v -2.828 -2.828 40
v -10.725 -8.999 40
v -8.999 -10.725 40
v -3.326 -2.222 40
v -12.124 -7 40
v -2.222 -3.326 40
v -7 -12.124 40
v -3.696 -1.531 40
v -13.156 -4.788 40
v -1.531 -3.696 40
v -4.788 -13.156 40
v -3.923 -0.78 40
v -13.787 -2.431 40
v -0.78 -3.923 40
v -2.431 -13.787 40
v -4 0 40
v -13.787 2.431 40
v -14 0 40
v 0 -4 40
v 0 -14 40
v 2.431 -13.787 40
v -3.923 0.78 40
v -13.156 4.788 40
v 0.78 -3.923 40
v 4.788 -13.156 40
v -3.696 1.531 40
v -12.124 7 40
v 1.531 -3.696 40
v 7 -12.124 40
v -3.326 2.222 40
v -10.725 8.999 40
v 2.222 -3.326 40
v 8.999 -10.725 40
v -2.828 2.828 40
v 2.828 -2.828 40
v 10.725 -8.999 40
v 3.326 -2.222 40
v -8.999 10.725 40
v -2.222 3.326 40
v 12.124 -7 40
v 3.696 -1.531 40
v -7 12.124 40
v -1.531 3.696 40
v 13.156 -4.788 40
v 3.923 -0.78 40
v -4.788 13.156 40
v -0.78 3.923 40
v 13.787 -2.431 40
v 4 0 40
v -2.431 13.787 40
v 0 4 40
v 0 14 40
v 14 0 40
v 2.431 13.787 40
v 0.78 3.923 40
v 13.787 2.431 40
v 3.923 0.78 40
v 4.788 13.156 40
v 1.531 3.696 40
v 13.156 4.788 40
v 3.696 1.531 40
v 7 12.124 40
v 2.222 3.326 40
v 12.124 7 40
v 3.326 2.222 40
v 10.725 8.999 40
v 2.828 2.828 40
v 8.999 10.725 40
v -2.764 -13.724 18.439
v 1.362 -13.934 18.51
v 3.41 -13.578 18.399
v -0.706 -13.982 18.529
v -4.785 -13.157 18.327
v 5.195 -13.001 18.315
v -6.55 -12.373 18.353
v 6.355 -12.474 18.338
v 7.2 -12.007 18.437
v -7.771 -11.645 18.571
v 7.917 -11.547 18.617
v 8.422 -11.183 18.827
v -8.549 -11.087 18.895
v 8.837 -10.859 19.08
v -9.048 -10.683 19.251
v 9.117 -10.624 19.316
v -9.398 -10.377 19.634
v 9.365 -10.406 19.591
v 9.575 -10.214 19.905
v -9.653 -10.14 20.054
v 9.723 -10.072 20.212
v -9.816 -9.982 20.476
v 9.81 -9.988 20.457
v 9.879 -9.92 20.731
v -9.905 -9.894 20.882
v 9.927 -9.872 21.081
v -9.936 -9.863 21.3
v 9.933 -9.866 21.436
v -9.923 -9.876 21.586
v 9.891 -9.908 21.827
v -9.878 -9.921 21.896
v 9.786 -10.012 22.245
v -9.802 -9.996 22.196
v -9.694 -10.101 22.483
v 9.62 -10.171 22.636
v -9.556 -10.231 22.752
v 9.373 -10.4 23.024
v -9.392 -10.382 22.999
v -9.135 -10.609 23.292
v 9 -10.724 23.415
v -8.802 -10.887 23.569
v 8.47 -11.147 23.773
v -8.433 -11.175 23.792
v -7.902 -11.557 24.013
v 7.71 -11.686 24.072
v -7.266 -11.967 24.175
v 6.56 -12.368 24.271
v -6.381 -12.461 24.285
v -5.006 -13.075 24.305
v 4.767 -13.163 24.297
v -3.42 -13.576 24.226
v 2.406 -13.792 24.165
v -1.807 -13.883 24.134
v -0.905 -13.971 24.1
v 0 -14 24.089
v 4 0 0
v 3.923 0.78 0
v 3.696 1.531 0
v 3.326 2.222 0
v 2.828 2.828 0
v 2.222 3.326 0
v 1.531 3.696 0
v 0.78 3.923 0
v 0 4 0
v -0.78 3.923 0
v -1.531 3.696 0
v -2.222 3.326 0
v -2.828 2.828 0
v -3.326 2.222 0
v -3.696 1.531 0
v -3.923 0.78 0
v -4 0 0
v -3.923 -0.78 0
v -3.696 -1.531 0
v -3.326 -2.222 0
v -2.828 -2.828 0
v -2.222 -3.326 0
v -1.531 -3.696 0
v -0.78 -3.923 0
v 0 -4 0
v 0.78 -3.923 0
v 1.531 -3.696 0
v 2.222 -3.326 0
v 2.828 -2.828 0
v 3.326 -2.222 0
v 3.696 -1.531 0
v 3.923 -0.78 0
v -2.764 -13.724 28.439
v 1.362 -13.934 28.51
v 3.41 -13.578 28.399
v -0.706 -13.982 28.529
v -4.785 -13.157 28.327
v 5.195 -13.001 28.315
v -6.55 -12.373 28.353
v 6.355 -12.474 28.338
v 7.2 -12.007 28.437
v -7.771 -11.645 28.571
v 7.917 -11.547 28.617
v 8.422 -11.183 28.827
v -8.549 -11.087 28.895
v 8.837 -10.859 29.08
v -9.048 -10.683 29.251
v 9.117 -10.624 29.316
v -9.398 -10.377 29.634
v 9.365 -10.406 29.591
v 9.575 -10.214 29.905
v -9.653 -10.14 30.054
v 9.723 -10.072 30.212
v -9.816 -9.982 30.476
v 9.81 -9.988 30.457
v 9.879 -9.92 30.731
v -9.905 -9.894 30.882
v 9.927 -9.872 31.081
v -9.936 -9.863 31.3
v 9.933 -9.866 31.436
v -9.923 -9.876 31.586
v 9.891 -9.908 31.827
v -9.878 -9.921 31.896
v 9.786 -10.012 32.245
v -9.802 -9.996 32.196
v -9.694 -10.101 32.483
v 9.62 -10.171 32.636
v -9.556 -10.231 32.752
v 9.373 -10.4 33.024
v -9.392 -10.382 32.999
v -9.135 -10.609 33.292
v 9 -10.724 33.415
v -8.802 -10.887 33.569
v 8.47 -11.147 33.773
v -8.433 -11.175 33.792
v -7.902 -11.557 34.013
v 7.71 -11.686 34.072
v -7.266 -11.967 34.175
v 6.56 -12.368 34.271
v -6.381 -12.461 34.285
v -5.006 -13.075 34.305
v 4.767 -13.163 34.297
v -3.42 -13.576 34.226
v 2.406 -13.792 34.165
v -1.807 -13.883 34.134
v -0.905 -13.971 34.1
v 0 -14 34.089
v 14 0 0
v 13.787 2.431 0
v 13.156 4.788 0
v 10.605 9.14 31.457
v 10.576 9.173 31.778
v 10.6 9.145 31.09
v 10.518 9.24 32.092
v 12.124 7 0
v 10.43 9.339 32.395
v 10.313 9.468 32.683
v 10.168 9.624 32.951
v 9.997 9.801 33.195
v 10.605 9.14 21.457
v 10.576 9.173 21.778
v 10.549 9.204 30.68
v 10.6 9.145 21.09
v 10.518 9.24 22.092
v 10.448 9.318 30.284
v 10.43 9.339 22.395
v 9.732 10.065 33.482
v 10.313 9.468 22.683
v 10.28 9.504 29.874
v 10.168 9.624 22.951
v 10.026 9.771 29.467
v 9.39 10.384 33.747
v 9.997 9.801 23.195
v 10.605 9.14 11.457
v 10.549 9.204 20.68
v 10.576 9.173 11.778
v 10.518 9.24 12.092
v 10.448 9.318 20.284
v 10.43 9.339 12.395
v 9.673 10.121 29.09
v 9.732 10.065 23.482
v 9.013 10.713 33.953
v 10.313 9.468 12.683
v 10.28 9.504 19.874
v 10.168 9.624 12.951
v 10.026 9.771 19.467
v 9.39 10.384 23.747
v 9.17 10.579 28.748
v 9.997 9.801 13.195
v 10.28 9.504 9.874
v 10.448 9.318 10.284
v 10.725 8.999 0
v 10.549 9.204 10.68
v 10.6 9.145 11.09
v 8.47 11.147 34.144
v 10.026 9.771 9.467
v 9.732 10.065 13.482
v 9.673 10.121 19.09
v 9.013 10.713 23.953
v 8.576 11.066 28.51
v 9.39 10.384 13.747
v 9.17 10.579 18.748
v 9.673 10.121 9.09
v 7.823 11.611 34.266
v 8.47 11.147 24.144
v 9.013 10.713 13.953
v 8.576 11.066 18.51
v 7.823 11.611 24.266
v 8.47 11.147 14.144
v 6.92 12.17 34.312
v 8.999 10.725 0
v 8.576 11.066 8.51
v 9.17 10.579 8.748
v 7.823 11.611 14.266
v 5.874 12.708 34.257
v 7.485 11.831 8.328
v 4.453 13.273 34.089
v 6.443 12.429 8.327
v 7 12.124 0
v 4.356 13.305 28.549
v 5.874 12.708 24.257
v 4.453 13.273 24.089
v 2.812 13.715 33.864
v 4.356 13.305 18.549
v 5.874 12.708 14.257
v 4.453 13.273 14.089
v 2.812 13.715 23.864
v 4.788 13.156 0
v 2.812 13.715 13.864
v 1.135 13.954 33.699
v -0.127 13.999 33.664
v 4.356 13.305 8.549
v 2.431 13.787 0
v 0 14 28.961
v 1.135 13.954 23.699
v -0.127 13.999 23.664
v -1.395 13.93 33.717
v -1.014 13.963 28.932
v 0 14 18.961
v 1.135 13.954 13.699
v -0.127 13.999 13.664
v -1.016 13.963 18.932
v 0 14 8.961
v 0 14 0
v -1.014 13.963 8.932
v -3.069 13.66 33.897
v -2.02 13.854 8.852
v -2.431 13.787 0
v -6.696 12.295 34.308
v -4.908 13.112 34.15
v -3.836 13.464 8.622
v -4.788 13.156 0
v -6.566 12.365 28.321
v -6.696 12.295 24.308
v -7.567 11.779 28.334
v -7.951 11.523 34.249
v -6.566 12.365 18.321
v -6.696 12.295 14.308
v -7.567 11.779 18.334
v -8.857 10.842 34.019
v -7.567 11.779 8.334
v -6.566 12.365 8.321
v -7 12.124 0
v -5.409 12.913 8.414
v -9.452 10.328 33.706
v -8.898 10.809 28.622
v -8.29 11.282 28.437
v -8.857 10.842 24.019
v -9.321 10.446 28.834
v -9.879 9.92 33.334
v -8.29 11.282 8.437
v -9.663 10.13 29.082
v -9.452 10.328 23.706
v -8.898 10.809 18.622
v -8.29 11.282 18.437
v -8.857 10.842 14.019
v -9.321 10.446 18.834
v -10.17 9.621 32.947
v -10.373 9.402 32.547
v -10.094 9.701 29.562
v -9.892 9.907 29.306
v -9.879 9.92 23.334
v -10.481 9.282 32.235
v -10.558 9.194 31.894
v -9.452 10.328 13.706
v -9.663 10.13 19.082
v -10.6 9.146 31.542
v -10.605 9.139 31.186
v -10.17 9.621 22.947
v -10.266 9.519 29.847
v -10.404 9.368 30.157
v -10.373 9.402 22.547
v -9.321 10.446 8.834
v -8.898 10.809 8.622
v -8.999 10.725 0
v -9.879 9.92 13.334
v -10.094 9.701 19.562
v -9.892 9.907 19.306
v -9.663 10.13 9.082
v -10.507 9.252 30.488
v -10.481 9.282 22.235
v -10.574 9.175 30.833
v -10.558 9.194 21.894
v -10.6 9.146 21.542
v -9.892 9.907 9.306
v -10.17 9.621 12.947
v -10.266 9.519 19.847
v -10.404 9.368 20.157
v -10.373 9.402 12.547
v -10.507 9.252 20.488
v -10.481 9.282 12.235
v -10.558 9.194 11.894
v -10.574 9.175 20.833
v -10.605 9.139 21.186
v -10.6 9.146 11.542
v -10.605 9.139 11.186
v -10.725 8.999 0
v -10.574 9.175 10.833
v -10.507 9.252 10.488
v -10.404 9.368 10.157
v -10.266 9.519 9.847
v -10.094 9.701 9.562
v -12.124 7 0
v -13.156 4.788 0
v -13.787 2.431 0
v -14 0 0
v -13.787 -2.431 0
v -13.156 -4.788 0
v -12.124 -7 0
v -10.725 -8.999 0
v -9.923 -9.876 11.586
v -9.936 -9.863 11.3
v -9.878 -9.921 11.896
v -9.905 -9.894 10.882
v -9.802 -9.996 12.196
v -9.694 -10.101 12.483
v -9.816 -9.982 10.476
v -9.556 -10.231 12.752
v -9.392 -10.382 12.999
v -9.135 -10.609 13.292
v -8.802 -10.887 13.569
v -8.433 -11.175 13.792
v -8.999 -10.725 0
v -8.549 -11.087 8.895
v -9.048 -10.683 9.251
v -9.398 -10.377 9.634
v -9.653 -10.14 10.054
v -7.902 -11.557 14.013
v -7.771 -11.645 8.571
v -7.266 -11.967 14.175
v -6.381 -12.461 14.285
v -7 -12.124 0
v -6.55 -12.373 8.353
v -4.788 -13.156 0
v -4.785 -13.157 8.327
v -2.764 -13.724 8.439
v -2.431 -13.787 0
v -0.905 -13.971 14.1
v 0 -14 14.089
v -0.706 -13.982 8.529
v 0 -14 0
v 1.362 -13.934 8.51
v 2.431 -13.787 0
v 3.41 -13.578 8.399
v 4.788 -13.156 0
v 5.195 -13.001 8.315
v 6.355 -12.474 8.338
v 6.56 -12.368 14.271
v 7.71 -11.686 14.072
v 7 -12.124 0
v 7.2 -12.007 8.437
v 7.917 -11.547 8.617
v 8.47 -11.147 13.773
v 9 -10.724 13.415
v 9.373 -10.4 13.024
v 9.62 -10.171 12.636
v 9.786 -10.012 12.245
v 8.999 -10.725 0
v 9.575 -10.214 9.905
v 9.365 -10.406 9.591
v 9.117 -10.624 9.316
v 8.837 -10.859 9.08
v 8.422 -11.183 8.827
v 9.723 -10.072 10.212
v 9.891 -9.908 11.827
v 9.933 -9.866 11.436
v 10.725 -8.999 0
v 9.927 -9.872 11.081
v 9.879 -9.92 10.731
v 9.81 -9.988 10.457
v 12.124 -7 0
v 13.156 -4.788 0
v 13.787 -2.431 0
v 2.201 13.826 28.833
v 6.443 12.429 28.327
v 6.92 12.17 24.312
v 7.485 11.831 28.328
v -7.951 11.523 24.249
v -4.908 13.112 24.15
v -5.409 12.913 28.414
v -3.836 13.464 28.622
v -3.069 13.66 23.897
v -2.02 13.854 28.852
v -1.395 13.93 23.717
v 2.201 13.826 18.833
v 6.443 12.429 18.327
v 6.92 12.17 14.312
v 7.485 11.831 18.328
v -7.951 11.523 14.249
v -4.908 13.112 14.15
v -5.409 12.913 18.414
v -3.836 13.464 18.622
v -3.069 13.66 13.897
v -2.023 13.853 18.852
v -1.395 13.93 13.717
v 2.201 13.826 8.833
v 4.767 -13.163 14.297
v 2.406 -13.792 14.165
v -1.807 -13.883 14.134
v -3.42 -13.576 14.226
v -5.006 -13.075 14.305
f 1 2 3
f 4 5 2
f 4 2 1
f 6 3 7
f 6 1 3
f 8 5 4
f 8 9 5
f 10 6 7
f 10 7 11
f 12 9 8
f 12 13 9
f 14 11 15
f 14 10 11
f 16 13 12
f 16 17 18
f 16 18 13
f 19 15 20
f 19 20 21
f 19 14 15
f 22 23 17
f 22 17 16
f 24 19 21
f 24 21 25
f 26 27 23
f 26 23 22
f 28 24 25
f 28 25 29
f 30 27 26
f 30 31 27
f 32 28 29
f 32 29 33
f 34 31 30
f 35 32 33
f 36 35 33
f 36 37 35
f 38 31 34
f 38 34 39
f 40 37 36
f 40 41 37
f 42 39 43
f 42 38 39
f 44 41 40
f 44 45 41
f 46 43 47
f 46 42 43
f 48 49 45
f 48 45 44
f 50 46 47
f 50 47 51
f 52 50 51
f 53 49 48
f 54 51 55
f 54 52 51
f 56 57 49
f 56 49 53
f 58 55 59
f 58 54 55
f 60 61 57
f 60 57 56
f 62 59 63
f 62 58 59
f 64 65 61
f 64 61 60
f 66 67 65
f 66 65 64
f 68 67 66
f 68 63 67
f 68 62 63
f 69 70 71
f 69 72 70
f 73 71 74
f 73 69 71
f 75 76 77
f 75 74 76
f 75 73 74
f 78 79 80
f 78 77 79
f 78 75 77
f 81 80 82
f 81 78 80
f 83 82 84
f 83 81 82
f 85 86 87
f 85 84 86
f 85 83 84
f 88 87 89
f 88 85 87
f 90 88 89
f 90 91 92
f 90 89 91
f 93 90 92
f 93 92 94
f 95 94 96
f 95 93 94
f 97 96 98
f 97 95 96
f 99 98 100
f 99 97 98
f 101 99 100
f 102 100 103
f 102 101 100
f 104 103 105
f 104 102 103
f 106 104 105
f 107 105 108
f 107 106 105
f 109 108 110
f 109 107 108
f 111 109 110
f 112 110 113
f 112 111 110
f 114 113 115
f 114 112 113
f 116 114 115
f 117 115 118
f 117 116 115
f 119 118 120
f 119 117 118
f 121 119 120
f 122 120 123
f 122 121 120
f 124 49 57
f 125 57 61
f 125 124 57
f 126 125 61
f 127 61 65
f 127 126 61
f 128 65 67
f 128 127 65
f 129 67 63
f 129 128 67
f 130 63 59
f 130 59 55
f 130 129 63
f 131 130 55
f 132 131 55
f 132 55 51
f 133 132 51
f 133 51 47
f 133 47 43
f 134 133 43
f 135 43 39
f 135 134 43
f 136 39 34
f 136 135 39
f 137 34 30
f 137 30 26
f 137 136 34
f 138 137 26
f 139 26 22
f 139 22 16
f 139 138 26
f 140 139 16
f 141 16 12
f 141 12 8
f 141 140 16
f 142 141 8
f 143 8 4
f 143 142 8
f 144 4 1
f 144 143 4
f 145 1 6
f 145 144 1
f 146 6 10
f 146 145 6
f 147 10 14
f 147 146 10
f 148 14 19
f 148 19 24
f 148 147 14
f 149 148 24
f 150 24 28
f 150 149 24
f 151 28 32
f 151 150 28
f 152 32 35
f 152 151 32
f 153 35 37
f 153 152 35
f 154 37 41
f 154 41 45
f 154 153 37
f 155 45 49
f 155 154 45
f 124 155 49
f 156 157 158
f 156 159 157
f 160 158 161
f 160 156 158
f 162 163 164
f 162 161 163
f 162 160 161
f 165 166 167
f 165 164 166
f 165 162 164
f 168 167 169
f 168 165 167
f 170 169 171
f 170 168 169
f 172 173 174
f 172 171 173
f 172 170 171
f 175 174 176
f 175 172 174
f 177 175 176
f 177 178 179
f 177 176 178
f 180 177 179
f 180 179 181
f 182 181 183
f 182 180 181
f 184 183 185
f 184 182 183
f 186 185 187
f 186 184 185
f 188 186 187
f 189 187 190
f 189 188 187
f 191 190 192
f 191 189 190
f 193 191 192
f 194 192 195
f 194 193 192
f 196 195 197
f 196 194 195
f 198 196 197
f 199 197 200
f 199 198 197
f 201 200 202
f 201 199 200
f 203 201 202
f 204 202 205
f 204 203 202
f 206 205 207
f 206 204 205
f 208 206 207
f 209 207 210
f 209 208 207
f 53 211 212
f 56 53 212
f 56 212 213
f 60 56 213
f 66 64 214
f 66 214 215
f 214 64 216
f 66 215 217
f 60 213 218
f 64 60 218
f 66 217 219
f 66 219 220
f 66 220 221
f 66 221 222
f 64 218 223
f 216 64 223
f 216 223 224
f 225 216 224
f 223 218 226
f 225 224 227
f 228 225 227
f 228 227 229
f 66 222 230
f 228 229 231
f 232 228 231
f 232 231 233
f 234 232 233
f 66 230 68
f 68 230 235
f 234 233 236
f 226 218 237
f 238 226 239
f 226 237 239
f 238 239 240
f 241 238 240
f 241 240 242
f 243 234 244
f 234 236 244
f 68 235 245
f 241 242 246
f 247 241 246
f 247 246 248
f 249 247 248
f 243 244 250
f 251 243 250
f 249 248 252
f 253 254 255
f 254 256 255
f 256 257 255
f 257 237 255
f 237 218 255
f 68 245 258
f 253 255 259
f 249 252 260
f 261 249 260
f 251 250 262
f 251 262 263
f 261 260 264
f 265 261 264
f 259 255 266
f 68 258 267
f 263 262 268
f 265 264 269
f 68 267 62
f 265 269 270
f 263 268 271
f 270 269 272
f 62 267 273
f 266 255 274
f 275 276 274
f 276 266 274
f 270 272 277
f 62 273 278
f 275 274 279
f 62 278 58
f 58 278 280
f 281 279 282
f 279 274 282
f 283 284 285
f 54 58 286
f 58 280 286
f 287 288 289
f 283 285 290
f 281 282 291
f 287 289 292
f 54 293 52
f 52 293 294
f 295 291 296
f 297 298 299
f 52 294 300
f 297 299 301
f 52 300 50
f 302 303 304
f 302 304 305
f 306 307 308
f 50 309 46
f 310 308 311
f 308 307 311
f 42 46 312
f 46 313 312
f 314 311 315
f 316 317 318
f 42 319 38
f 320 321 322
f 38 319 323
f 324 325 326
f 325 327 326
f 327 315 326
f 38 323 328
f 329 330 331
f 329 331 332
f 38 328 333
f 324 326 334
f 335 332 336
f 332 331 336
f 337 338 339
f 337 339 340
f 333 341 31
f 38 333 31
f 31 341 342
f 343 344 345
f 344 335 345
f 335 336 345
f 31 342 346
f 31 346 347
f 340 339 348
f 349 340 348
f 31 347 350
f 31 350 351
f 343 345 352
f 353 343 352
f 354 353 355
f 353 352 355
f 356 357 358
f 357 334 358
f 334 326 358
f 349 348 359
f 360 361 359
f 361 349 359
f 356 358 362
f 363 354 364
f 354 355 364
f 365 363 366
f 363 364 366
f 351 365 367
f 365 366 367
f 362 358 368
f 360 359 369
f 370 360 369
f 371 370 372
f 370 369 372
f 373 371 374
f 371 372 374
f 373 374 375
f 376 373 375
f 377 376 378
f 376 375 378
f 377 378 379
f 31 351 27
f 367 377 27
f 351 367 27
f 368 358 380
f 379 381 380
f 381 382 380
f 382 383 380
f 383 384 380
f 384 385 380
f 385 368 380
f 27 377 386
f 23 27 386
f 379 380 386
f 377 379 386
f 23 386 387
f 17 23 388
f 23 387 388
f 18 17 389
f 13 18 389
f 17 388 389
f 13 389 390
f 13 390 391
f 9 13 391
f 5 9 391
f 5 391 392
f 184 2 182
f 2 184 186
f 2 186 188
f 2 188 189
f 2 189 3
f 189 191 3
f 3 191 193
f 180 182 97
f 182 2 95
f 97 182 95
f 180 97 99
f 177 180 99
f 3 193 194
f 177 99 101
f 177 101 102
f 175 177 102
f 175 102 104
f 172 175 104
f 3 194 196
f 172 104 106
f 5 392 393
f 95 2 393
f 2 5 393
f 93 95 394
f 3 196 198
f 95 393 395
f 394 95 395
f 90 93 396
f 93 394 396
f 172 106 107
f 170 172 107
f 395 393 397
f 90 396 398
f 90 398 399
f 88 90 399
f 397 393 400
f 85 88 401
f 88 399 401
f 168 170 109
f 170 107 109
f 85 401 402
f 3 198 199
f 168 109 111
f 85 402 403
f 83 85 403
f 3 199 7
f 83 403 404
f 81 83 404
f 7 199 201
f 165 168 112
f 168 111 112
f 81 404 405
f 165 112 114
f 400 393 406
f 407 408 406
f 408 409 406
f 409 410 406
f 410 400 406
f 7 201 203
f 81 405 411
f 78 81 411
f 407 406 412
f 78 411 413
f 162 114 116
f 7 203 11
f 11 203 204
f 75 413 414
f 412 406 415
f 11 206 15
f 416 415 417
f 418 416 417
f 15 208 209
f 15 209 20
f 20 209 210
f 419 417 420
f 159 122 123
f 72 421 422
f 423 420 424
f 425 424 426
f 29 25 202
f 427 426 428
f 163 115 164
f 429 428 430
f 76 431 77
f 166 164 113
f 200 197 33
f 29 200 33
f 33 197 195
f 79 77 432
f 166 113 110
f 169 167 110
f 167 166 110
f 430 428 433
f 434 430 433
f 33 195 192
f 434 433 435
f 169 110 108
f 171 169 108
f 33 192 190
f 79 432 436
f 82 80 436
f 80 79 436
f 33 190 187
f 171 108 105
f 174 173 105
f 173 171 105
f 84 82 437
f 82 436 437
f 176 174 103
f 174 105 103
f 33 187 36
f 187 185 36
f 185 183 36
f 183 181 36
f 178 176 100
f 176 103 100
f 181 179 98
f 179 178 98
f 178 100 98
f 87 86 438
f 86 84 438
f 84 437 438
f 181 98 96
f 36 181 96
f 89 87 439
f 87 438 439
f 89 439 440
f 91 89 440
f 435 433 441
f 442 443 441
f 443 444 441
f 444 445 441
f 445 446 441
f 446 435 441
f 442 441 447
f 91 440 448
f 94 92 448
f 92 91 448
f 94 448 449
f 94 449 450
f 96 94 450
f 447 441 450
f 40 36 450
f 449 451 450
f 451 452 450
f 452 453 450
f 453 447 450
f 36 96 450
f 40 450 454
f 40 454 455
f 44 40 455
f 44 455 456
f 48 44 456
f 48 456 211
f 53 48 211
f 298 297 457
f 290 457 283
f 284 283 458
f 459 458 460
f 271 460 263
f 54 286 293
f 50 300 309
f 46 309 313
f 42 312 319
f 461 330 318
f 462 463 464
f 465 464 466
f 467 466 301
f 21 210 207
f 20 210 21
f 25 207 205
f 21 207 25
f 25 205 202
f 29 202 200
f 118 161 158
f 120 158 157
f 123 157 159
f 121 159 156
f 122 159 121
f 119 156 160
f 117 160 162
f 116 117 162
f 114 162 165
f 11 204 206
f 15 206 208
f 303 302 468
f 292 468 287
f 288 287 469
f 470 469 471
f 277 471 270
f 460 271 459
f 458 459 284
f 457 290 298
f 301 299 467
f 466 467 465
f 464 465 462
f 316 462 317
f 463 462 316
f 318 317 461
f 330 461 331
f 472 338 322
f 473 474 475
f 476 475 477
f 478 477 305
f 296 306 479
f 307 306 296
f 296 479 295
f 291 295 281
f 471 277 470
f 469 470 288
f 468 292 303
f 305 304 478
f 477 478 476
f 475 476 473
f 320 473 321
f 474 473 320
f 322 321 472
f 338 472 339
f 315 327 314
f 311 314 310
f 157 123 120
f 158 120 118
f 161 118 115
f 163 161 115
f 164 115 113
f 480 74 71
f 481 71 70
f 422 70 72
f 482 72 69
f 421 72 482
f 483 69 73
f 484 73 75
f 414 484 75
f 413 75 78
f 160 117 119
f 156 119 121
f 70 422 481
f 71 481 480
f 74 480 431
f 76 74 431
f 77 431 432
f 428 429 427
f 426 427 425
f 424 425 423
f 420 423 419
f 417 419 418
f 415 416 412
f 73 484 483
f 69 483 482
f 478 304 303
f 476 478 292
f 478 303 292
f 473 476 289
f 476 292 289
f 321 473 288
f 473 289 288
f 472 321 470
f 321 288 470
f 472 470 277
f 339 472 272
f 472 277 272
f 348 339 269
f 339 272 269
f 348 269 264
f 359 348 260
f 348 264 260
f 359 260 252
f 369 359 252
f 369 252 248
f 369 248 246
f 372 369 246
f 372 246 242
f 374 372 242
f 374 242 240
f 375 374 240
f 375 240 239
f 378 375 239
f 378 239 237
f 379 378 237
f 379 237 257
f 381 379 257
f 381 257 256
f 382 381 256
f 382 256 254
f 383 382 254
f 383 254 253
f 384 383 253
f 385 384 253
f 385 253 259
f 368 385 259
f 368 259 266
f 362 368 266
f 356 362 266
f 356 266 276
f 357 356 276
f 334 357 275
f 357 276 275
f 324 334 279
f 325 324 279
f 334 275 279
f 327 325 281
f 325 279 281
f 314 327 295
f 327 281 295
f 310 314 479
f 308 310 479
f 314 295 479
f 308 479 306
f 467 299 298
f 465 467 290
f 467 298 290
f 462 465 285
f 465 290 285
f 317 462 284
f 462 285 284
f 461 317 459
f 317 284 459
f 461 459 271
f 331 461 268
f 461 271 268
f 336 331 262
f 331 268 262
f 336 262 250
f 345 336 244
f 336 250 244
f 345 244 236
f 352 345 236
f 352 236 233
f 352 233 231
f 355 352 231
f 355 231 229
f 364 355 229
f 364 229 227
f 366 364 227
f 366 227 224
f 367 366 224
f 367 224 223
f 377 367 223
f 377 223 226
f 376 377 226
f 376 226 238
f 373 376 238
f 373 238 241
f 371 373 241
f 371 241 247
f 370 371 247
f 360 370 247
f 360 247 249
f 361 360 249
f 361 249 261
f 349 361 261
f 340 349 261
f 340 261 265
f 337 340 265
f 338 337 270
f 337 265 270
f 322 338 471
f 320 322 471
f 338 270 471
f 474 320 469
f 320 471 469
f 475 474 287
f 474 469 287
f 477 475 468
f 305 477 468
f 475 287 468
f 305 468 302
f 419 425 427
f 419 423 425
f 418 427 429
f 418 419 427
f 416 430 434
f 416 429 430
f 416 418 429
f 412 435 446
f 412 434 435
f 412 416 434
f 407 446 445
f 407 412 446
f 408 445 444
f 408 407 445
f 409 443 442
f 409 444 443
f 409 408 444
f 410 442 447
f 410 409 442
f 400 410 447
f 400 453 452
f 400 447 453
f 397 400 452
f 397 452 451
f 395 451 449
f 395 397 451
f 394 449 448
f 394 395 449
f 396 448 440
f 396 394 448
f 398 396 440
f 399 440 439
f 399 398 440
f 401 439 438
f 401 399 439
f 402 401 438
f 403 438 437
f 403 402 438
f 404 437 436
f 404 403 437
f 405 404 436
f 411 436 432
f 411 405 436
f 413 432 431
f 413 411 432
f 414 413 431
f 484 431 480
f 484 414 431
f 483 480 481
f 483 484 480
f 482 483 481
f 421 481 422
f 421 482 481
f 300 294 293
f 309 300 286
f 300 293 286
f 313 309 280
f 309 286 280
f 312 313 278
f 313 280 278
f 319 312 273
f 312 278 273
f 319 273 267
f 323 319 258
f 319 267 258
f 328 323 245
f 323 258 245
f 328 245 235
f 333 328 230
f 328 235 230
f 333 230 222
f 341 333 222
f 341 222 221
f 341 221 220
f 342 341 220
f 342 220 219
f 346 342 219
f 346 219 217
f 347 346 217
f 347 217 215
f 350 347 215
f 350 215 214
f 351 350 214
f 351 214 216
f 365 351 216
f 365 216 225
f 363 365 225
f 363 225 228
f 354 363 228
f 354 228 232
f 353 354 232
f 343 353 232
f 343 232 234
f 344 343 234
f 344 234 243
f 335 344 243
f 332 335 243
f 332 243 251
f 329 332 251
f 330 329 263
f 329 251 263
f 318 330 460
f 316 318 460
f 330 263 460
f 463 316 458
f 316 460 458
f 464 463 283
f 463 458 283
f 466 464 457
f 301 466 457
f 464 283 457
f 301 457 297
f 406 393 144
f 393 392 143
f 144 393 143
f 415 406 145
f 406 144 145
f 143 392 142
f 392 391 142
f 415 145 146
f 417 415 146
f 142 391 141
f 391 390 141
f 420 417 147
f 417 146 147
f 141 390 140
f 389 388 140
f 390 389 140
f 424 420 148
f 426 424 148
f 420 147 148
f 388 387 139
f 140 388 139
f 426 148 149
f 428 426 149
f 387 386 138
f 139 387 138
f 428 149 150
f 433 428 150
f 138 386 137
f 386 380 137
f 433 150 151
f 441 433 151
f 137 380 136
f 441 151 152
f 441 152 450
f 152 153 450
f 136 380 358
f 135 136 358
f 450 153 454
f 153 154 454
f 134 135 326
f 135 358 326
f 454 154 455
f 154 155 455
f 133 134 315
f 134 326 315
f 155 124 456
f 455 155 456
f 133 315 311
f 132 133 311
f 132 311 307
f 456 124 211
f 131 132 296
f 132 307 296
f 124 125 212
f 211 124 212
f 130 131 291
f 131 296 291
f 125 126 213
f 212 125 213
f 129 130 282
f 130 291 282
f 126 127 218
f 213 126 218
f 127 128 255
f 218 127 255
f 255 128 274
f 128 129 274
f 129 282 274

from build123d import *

# Parameters (mm, degrees)
SKETCH1_R               = 14
SKETCH1_R_2             = 4
EXTRUDE_THIN1_DEPTH     = 40
SKETCH2_R               = 3
CUT_EXTRUDE1_DEPTH      = 15
CUT_EXTRUDE1_DEPTH_BACK = 15


with BuildPart() as part:
    # Sketch1 → Extrude-Thin1 (new body)
    with BuildSketch(Plane.XY):
        Circle(SKETCH1_R)
        Circle(SKETCH1_R_2, mode=Mode.SUBTRACT)
    extrude(amount=EXTRUDE_THIN1_DEPTH)

    # Sketch2 → Cut-Extrude1 (cut, two sides)
    with BuildSketch(Plane(origin=(0, 0, 0), x_dir=(0, 0, -1), z_dir=(1, 0, 0))) as cut_extrude1_sk:
        with Locations((-31.312329447, 12.13670973)):
            Circle(SKETCH2_R)
        with Locations((-21.312329447, 12.13670973)):
            Circle(SKETCH2_R)
        with Locations((-11.312329447, 12.13670973)):
            Circle(SKETCH2_R)
        with Locations((-21.312329447, -12.86329027)):
            Circle(SKETCH2_R)
        with Locations((-11.312329447, -12.86329027)):
            Circle(SKETCH2_R)
        with Locations((-31.312329447, -12.86329027)):
            Circle(SKETCH2_R)
    extrude(amount=CUT_EXTRUDE1_DEPTH, mode=Mode.SUBTRACT)
    extrude(cut_extrude1_sk.sketch, amount=-CUT_EXTRUDE1_DEPTH_BACK, mode=Mode.SUBTRACT)


solid = part.part
